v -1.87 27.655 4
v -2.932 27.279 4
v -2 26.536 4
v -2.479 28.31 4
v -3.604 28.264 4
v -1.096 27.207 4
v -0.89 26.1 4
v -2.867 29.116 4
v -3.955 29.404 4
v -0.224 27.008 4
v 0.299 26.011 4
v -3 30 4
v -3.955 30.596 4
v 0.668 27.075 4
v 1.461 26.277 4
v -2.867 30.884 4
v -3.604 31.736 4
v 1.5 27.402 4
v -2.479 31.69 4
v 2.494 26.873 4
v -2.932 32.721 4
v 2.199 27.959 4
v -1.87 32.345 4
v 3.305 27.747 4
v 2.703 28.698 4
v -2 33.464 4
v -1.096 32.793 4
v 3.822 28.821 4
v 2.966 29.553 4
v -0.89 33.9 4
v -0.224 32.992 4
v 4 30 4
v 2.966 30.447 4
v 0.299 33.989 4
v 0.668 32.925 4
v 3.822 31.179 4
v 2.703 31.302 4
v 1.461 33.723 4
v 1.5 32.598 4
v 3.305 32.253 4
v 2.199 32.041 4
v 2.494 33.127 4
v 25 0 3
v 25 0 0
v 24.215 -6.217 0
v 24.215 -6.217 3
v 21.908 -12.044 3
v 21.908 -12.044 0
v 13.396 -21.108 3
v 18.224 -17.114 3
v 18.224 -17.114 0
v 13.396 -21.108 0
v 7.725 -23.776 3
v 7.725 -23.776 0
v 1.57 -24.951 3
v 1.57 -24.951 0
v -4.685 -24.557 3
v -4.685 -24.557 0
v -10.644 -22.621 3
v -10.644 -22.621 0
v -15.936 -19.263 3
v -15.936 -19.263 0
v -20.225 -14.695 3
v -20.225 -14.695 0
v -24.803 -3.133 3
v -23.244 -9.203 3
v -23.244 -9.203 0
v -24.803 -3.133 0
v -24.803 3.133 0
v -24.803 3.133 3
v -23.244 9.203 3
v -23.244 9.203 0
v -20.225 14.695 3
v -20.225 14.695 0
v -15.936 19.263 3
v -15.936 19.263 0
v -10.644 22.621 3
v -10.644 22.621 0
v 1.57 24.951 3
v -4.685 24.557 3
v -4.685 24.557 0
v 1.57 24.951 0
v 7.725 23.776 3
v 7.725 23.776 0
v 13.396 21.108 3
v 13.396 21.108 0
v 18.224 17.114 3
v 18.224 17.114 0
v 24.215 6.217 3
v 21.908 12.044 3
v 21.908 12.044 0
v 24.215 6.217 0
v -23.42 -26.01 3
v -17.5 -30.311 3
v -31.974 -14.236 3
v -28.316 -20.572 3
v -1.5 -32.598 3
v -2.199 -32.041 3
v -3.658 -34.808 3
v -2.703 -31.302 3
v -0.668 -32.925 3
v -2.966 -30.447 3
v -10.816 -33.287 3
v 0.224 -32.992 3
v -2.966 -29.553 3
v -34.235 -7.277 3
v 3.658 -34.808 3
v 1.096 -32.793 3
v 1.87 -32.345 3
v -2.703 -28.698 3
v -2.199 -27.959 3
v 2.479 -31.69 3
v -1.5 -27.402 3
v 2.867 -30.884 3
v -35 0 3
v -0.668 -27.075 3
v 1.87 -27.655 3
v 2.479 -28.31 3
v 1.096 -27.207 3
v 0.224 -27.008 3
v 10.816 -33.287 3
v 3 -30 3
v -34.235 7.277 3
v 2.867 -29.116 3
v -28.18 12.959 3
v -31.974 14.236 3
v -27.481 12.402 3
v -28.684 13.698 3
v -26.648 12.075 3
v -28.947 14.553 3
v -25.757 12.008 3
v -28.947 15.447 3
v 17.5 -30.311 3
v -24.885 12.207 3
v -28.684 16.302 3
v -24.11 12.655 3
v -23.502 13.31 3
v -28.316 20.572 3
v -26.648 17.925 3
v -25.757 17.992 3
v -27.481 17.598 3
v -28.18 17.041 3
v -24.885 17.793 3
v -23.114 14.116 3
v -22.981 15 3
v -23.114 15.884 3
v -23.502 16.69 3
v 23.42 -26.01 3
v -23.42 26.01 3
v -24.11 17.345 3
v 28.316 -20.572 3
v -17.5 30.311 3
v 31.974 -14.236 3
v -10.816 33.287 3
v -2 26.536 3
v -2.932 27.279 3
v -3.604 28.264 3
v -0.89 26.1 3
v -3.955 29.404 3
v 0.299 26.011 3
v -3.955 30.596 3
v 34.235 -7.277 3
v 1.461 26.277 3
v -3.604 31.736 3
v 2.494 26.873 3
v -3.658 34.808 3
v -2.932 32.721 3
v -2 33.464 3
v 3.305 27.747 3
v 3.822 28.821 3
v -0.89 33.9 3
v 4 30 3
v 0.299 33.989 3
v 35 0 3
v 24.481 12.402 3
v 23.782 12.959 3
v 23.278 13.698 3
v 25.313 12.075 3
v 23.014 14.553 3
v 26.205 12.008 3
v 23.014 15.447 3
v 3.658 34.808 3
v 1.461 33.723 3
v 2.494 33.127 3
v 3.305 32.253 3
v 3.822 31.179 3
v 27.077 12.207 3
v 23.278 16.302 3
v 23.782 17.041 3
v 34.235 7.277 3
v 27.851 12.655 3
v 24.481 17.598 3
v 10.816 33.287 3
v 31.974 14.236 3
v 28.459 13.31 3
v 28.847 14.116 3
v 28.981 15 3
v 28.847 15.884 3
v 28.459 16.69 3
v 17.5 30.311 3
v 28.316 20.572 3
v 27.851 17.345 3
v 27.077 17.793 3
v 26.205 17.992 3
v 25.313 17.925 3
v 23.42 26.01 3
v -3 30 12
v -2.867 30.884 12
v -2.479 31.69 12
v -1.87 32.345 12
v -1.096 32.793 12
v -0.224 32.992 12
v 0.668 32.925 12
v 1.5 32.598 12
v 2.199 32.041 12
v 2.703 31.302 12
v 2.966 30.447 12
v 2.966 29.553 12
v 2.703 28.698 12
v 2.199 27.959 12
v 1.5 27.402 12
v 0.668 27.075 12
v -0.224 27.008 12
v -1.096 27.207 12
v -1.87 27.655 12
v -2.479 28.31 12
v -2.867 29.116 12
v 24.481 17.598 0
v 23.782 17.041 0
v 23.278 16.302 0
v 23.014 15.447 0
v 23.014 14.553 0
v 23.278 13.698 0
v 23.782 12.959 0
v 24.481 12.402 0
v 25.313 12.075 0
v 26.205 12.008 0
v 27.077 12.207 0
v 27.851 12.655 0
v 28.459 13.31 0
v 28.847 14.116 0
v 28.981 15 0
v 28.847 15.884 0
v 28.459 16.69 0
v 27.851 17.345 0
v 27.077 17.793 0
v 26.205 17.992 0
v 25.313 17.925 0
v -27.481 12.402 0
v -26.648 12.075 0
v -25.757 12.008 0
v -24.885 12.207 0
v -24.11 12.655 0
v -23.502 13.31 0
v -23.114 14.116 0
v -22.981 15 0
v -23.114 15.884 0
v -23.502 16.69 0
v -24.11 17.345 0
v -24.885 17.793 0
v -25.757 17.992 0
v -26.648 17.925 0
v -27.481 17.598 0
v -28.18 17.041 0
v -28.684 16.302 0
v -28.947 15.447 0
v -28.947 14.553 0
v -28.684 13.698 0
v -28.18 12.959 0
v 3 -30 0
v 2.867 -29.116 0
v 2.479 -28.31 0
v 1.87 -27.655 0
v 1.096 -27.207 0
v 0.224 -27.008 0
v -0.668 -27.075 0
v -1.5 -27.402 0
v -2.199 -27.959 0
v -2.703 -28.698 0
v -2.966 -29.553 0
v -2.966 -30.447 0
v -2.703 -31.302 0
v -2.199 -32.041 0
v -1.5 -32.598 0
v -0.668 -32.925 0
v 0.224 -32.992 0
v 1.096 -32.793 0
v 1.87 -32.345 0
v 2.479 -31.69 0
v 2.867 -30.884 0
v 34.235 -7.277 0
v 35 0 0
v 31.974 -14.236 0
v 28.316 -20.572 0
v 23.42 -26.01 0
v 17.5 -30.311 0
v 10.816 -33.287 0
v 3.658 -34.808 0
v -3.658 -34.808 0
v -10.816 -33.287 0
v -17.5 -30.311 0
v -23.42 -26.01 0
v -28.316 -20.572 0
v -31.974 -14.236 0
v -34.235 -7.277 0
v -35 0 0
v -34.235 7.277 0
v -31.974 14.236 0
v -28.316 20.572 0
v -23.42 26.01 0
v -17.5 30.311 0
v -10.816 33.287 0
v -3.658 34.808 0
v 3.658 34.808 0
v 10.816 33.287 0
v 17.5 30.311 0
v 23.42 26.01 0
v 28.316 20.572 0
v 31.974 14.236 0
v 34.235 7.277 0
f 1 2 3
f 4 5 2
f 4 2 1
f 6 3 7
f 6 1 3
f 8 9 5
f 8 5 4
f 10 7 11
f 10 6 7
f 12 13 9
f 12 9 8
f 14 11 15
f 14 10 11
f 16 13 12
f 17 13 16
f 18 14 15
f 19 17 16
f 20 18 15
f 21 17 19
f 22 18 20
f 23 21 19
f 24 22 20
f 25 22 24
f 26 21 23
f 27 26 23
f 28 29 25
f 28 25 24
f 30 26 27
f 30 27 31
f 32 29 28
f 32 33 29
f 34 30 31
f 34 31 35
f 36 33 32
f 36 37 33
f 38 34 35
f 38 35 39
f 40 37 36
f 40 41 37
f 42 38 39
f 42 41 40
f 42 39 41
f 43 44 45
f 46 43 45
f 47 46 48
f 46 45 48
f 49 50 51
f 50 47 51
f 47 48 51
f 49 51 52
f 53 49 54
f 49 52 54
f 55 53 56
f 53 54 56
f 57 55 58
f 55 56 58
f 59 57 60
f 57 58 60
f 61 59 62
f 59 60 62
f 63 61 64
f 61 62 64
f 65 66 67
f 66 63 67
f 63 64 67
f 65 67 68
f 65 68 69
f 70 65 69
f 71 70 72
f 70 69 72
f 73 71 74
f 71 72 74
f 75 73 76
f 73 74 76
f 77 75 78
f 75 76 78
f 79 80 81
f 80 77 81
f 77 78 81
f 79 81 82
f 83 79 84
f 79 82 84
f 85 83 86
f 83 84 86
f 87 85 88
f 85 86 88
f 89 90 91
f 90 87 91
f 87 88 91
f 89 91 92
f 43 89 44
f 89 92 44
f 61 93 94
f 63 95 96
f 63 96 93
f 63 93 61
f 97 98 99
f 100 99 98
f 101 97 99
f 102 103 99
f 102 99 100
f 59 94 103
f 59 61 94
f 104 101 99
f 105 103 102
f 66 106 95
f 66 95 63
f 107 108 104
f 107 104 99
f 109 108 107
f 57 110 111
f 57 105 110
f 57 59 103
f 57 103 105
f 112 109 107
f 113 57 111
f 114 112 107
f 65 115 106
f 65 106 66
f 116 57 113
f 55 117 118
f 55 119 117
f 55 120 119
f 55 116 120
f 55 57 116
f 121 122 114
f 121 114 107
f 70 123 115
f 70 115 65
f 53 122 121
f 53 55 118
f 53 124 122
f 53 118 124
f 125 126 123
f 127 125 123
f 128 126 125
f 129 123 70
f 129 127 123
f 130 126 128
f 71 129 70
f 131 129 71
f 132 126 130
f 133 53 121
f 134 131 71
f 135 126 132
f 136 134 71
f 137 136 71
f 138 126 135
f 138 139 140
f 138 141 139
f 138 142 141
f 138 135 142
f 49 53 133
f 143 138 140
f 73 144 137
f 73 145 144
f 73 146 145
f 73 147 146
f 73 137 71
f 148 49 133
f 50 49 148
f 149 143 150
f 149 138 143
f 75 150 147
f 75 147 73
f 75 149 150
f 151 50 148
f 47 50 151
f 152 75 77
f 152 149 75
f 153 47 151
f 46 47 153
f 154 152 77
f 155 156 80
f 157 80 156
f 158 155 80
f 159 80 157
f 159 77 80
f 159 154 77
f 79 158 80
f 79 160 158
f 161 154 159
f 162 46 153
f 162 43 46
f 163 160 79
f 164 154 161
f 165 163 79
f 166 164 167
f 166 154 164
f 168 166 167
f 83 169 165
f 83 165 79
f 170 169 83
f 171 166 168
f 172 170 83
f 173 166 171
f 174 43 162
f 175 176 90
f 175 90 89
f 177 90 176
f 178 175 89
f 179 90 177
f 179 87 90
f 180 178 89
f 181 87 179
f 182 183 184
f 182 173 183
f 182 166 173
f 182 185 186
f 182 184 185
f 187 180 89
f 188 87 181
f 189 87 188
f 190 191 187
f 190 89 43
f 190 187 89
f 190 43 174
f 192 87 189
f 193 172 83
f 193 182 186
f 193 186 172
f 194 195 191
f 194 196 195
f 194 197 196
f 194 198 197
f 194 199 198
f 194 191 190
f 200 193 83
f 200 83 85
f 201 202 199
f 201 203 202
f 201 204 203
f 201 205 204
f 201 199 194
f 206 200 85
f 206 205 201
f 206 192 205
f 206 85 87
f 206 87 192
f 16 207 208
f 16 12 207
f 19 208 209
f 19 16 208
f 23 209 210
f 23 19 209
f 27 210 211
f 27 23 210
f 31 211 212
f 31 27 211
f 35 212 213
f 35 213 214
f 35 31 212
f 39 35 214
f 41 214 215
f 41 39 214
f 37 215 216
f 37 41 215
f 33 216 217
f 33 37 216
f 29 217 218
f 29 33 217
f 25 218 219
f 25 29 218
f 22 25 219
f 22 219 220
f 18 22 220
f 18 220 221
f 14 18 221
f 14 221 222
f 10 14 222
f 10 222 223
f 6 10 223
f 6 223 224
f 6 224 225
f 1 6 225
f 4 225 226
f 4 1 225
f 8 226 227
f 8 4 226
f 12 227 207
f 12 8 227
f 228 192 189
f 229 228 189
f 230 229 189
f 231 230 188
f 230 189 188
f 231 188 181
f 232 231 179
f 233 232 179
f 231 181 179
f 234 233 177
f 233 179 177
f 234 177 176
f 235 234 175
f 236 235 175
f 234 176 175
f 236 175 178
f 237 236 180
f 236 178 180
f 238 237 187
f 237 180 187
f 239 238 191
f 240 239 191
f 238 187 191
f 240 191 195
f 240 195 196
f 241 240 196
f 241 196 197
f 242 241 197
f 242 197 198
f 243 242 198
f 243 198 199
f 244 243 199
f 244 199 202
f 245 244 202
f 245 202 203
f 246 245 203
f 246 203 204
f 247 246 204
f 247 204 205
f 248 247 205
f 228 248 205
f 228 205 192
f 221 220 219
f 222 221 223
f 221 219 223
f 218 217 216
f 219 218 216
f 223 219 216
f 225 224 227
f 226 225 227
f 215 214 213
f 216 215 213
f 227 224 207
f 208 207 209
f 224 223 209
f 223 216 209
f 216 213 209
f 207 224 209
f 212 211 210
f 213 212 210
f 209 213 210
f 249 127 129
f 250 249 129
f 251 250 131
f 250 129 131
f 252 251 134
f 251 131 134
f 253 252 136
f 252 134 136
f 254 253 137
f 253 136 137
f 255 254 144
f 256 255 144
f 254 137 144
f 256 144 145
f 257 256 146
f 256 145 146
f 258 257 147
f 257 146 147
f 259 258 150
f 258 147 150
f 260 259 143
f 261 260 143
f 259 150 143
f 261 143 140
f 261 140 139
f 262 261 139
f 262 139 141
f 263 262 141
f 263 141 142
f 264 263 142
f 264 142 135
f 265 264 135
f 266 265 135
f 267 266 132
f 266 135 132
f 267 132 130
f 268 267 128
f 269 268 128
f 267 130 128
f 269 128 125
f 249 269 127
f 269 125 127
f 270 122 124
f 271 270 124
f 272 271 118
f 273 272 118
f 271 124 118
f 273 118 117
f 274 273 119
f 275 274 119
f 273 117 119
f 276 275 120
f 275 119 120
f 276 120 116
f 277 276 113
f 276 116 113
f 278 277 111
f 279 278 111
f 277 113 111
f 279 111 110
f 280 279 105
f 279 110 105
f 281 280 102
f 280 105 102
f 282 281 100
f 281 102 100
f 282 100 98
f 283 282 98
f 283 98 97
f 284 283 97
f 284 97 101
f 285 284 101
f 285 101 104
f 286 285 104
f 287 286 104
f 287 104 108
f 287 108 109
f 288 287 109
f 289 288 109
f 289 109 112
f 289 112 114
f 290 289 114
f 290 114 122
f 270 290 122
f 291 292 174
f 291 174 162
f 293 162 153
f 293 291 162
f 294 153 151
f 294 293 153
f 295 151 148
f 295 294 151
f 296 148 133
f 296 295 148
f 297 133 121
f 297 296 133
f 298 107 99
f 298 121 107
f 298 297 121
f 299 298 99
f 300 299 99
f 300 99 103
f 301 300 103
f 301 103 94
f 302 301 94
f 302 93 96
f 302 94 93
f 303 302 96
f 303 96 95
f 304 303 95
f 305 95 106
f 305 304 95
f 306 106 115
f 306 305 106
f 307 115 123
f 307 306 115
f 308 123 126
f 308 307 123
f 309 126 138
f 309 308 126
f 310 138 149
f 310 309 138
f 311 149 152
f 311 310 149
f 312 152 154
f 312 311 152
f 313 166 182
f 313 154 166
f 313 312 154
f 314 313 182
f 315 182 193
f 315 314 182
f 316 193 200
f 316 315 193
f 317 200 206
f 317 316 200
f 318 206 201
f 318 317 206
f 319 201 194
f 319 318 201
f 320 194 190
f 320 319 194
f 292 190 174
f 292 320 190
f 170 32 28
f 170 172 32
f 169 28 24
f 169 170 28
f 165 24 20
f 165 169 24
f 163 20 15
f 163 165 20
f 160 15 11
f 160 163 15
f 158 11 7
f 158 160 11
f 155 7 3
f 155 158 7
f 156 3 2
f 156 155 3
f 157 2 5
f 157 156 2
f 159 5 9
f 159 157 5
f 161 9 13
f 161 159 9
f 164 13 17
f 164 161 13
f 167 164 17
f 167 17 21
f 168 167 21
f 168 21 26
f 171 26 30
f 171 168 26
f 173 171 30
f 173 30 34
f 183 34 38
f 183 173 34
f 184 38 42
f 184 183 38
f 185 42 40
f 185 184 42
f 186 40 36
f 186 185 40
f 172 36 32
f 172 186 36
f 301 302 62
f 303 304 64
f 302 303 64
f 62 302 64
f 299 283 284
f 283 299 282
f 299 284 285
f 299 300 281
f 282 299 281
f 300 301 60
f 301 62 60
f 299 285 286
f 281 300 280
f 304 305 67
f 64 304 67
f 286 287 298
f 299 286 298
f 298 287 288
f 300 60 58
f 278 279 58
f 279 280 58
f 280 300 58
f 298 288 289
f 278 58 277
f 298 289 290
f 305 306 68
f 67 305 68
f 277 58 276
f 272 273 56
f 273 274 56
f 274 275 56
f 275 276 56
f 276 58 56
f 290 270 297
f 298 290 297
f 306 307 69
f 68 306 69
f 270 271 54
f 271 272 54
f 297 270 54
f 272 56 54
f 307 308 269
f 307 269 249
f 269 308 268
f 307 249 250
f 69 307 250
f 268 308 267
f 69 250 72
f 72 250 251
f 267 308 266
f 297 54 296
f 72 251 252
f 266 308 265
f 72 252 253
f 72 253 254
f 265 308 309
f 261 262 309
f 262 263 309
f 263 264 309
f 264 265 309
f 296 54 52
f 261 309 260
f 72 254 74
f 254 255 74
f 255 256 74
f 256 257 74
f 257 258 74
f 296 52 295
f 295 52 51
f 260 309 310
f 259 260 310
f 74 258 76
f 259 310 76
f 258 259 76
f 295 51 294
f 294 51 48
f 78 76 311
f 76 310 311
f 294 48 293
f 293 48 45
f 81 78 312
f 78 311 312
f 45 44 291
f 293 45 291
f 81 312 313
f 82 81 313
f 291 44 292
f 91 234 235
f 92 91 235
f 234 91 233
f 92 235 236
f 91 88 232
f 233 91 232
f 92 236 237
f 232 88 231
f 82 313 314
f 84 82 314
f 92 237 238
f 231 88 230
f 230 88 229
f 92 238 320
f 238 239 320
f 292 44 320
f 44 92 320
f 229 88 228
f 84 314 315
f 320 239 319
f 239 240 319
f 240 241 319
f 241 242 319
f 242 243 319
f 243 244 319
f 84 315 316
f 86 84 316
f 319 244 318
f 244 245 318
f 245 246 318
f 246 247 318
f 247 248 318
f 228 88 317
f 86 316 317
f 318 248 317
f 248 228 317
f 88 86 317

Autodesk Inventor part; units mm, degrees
ref_plane "YZ Plane" through (0, 0, 0) normal (1, 0, 0) x (0, 1, 0)
ref_plane "XZ Plane" through (0, 0, 0) normal (0, 1, 0) x (-1, 0, 0)
ref_plane "XY Plane" through (0, 0, 0) normal (0, 0, 1) x (1, 0, 0)
sketch "Sketch1" plane through (0, 0, 0) normal (0, 0, 1) x (1, 0, 0)
  circle A0 centre (0, 0) radius 30 construction
  line L0 (0, 0) -> (0, 7.5) construction
  line L1 (0, 7.5) -> (10, 7.5) construction
  line L2 (10, 7.5) -> (10, 0) construction
  line L3 (10, 0) -> (0, 0) construction
  line L4 (0, 0) -> (-10, 0) construction
  line L5 (-10, 0) -> (-10, 7.5) construction
  line L6 (-10, 7.5) -> (0, 7.5) construction
  line L7 (-10, 0) -> (-10, -7.5) construction
  line L8 (-10, -7.5) -> (10, -7.5) construction
  line L9 (10, -7.5) -> (10, 0) construction
  circle A1 centre (-15.5891, 25.6316) radius 10 construction
  circle A2 centre (0, 0) radius 35
  circle A3 centre (0, 0) radius 25
  line L10 (0, 0) -> (-31.8198, 31.8198) construction
  circle A4 centre (0, 0) radius 45 construction
  line L11 (0, 0) -> (0, 45) construction
  circle A5 centre (0, 0) radius 40 construction
  circle A6 centre (-40, 0) radius 5 construction
  circle A7 centre (-31.8198, 31.8198) radius 10 construction
  line L12 (-31.8198, 31.8198) -> (-31.8198, -24.2384) construction
  line L13 (-31.8198, -24.2384) -> (-31.8198, -31.8198) construction
  circle A8 centre (-31.8198, -31.8198) radius 10 construction
  line L14 (-15, -20) -> (-15, -31.6228) construction
  line L15 (15, -20) -> (15, -31.6228) construction
  line L16 (-31.8198, 31.8198) -> (24.2384, 31.8198) construction
  line L17 (24.2384, 31.8198) -> (31.8198, 31.8198) construction
  line L18 (31.8198, 31.8198) -> (31.8198, -31.8198) construction
  line L19 (31.8198, -31.8198) -> (-31.8198, -31.8198) construction
  circle A9 centre (31.8198, 31.8198) radius 10 construction
  circle A10 centre (31.8198, -31.8198) radius 10 construction
  circle A11 centre (0, 40) radius 5 construction
  line L20 (0, 0) -> (40, 0) construction
  line L21 (0, 0) -> (0, -40) construction
  circle A12 centre (40, 0) radius 5 construction
  circle A13 centre (0, -40) radius 5 construction
  line L22 (50, 50) -> (50, -50) construction
  line L23 (50, -50) -> (-50, -50) construction
  line L24 (-50, -50) -> (-50, 50) construction
  line L25 (-50, 50) -> (50, 50) construction
  circle A14 centre (0, 30) radius 3
  point P0 (0, 50)
  dimension "d9" = 80
  dimension "d0" = 60
  dimension "d1" = 20
  dimension "d2" = 15
  dimension "d3" = 20
  dimension "d4" = 5
  dimension "d5" = 5
  dimension "d6" = 90
  dimension "d7" = 45
  dimension "d10" = 10
  dimension "d12" = 20
  dimension "d13" = 15
  dimension "d14" = 100
  dimension "d15" = 6
extrude "Extrusion1" add sketch "Sketch1" along normal blind 3
sketch "Sketch2" plane through (0, 0, 0) normal (0, 0, -1) x (-1, 0, 0)
  circle A0 centre (0, 30) radius 3 projected
extrude "Extrusion2" add sketch "Sketch2" against normal blind 12
sketch "Sketch3" plane through (0, 0, 3) normal (0, 0, 1) x (1, 0, 0)
  circle A0 centre (0, 30) radius 3 projected
  circle A1 centre (0, 30) radius 4
  dimension "d20" = 8
extrude "Extrusion3" add sketch "Sketch3" along normal blind 1
sketch "Sketch4" plane through (0, 0, 3) normal (0, 0, 1) x (1, 0, 0)
  circle A0 centre (0, 0) radius 25 projected
  circle A1 centre (0, 0) radius 35 projected
  line L0 (0, 0) -> (0, -25) construction
  line L1 (0, -25) -> (0, -35) construction
  circle A2 centre (0, -30) radius 3
  dimension "d23" = 6
extrude "Extrusion4" cut sketch "Sketch4" against normal blind 10 contours A2
pattern_circular "Circular Pattern1" count 3 over 360 about axis through (0, 0, -10) along (0, 0, 1) of "Extrusion4"
properties part number "Ring1"
